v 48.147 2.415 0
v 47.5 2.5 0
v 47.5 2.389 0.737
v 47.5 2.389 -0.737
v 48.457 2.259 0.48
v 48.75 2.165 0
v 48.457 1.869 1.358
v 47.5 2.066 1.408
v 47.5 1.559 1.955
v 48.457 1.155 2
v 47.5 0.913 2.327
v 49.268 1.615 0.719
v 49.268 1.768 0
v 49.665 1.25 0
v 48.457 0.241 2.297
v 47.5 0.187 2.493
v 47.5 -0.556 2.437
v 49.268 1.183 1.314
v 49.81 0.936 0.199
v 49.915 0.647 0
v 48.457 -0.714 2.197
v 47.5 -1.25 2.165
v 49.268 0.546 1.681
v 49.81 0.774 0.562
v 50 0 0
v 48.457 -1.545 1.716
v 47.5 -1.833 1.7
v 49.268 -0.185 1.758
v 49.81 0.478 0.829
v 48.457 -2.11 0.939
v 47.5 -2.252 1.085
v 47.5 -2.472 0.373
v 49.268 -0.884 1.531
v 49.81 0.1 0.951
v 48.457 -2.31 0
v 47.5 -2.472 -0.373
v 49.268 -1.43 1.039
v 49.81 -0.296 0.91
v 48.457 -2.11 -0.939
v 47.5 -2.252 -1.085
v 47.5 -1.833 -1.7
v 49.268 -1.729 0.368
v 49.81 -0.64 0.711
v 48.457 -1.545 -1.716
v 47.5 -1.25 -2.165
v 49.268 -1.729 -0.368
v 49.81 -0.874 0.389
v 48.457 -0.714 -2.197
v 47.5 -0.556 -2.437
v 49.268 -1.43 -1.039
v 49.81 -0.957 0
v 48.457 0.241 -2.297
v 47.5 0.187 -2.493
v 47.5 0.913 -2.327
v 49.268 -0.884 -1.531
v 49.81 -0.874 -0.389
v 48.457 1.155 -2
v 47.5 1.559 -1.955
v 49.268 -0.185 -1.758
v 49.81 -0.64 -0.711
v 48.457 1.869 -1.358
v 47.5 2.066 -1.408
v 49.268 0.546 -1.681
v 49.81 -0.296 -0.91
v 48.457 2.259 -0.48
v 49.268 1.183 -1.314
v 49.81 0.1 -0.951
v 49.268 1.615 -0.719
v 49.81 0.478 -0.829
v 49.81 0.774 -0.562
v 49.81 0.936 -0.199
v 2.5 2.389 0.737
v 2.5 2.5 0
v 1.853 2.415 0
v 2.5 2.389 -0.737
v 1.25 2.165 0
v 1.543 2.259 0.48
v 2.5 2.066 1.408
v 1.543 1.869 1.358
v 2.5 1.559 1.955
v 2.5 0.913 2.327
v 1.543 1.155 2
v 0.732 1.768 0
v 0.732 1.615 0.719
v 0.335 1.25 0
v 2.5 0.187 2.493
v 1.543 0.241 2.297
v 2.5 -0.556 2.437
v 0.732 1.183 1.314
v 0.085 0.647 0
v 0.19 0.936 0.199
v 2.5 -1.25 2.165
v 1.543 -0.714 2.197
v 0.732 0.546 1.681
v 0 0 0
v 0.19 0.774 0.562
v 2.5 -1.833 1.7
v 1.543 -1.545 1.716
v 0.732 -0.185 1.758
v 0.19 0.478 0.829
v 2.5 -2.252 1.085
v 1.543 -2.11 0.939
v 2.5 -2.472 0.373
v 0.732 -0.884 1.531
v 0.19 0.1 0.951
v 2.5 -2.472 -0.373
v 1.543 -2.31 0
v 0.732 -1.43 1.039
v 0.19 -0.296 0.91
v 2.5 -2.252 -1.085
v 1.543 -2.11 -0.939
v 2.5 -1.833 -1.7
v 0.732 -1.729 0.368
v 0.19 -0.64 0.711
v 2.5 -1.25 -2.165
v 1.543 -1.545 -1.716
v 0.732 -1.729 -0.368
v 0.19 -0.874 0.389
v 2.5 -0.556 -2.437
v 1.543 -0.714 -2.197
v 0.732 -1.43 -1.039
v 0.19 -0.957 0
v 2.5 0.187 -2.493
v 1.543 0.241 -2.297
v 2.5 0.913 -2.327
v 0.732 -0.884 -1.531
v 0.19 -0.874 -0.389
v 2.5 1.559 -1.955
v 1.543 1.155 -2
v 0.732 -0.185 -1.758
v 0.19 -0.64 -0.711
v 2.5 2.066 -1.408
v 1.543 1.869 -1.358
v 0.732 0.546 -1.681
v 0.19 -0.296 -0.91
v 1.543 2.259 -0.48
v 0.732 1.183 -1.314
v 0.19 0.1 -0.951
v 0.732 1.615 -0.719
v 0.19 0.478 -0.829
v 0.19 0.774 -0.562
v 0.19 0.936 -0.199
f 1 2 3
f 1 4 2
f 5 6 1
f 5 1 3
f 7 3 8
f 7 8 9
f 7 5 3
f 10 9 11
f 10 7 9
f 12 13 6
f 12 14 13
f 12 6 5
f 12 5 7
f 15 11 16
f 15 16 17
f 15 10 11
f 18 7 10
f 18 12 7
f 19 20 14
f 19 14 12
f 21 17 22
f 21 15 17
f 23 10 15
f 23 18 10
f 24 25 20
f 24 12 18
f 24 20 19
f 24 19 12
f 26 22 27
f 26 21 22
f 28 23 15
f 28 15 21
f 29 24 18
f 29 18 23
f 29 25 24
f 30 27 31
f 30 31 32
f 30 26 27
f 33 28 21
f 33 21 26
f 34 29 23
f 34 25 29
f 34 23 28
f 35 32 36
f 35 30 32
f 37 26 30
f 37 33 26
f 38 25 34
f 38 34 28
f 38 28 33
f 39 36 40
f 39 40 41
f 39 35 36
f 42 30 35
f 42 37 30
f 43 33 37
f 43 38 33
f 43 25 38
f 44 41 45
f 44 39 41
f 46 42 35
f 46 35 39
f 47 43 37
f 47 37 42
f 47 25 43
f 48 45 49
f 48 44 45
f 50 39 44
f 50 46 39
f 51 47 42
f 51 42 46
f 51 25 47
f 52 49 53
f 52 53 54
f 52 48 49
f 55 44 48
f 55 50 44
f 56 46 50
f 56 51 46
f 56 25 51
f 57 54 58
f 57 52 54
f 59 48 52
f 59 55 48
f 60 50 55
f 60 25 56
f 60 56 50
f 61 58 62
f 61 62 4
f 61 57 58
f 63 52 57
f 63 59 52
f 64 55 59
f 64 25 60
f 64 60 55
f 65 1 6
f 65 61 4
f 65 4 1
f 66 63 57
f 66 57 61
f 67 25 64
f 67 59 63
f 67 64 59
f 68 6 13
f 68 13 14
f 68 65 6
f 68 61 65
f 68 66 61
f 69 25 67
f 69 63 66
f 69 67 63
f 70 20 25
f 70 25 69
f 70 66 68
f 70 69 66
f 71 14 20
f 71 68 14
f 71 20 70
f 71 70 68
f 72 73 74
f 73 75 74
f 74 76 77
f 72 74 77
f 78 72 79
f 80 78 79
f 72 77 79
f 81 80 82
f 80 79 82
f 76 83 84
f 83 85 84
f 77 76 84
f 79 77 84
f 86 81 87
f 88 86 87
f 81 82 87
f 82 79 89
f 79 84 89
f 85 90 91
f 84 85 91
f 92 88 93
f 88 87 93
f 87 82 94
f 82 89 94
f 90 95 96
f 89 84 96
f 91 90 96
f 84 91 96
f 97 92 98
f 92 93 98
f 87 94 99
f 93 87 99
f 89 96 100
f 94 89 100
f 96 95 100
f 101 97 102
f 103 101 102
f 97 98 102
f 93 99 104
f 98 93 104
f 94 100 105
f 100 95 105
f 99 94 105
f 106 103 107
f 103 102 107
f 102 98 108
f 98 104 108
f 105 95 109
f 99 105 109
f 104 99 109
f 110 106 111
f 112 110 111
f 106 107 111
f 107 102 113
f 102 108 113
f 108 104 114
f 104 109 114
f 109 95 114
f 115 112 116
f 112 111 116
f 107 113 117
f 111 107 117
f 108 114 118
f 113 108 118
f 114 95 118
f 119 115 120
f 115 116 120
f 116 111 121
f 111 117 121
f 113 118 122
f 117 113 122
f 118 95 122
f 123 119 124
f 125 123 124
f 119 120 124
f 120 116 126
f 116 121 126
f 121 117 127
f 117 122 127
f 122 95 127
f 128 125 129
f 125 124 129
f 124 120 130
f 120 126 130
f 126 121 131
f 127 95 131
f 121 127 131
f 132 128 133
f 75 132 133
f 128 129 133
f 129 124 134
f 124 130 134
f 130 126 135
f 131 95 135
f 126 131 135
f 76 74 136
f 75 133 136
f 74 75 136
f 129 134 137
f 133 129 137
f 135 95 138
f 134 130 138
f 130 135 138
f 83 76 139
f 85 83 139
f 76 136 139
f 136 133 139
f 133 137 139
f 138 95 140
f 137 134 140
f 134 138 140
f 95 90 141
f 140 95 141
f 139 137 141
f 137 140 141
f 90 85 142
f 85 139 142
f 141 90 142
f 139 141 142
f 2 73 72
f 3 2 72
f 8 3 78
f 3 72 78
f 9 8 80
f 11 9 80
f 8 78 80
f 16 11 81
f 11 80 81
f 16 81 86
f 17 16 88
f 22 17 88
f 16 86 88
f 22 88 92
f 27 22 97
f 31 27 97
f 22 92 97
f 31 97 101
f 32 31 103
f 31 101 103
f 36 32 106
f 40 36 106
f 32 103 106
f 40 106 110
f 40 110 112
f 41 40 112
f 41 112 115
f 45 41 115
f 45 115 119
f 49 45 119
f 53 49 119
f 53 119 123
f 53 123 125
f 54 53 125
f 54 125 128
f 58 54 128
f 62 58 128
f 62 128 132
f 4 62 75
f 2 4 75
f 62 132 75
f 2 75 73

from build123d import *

# Parameters (mm, degrees)
F0_R     = 2.5
F1_DEPTH = 50
F2_R     = 2.5
F3_R     = 2.5


with BuildPart() as f1:
    # F0 (on Right) → F1 (new body)
    with BuildSketch(Plane.YZ):
        Circle(F0_R)
    extrude(amount=F1_DEPTH)

    # F2
    f2_edges = [f1.edges().sort_by_distance(p)[0] for p in [
        (50, -2.5, 0),
    ]]
    fillet(f2_edges, radius=F2_R)

    # F3
    f3_edges = [f1.edges().sort_by_distance(p)[0] for p in [
        (0, -2.5, 0),
    ]]
    fillet(f3_edges, radius=F3_R)


solid = f1.part
